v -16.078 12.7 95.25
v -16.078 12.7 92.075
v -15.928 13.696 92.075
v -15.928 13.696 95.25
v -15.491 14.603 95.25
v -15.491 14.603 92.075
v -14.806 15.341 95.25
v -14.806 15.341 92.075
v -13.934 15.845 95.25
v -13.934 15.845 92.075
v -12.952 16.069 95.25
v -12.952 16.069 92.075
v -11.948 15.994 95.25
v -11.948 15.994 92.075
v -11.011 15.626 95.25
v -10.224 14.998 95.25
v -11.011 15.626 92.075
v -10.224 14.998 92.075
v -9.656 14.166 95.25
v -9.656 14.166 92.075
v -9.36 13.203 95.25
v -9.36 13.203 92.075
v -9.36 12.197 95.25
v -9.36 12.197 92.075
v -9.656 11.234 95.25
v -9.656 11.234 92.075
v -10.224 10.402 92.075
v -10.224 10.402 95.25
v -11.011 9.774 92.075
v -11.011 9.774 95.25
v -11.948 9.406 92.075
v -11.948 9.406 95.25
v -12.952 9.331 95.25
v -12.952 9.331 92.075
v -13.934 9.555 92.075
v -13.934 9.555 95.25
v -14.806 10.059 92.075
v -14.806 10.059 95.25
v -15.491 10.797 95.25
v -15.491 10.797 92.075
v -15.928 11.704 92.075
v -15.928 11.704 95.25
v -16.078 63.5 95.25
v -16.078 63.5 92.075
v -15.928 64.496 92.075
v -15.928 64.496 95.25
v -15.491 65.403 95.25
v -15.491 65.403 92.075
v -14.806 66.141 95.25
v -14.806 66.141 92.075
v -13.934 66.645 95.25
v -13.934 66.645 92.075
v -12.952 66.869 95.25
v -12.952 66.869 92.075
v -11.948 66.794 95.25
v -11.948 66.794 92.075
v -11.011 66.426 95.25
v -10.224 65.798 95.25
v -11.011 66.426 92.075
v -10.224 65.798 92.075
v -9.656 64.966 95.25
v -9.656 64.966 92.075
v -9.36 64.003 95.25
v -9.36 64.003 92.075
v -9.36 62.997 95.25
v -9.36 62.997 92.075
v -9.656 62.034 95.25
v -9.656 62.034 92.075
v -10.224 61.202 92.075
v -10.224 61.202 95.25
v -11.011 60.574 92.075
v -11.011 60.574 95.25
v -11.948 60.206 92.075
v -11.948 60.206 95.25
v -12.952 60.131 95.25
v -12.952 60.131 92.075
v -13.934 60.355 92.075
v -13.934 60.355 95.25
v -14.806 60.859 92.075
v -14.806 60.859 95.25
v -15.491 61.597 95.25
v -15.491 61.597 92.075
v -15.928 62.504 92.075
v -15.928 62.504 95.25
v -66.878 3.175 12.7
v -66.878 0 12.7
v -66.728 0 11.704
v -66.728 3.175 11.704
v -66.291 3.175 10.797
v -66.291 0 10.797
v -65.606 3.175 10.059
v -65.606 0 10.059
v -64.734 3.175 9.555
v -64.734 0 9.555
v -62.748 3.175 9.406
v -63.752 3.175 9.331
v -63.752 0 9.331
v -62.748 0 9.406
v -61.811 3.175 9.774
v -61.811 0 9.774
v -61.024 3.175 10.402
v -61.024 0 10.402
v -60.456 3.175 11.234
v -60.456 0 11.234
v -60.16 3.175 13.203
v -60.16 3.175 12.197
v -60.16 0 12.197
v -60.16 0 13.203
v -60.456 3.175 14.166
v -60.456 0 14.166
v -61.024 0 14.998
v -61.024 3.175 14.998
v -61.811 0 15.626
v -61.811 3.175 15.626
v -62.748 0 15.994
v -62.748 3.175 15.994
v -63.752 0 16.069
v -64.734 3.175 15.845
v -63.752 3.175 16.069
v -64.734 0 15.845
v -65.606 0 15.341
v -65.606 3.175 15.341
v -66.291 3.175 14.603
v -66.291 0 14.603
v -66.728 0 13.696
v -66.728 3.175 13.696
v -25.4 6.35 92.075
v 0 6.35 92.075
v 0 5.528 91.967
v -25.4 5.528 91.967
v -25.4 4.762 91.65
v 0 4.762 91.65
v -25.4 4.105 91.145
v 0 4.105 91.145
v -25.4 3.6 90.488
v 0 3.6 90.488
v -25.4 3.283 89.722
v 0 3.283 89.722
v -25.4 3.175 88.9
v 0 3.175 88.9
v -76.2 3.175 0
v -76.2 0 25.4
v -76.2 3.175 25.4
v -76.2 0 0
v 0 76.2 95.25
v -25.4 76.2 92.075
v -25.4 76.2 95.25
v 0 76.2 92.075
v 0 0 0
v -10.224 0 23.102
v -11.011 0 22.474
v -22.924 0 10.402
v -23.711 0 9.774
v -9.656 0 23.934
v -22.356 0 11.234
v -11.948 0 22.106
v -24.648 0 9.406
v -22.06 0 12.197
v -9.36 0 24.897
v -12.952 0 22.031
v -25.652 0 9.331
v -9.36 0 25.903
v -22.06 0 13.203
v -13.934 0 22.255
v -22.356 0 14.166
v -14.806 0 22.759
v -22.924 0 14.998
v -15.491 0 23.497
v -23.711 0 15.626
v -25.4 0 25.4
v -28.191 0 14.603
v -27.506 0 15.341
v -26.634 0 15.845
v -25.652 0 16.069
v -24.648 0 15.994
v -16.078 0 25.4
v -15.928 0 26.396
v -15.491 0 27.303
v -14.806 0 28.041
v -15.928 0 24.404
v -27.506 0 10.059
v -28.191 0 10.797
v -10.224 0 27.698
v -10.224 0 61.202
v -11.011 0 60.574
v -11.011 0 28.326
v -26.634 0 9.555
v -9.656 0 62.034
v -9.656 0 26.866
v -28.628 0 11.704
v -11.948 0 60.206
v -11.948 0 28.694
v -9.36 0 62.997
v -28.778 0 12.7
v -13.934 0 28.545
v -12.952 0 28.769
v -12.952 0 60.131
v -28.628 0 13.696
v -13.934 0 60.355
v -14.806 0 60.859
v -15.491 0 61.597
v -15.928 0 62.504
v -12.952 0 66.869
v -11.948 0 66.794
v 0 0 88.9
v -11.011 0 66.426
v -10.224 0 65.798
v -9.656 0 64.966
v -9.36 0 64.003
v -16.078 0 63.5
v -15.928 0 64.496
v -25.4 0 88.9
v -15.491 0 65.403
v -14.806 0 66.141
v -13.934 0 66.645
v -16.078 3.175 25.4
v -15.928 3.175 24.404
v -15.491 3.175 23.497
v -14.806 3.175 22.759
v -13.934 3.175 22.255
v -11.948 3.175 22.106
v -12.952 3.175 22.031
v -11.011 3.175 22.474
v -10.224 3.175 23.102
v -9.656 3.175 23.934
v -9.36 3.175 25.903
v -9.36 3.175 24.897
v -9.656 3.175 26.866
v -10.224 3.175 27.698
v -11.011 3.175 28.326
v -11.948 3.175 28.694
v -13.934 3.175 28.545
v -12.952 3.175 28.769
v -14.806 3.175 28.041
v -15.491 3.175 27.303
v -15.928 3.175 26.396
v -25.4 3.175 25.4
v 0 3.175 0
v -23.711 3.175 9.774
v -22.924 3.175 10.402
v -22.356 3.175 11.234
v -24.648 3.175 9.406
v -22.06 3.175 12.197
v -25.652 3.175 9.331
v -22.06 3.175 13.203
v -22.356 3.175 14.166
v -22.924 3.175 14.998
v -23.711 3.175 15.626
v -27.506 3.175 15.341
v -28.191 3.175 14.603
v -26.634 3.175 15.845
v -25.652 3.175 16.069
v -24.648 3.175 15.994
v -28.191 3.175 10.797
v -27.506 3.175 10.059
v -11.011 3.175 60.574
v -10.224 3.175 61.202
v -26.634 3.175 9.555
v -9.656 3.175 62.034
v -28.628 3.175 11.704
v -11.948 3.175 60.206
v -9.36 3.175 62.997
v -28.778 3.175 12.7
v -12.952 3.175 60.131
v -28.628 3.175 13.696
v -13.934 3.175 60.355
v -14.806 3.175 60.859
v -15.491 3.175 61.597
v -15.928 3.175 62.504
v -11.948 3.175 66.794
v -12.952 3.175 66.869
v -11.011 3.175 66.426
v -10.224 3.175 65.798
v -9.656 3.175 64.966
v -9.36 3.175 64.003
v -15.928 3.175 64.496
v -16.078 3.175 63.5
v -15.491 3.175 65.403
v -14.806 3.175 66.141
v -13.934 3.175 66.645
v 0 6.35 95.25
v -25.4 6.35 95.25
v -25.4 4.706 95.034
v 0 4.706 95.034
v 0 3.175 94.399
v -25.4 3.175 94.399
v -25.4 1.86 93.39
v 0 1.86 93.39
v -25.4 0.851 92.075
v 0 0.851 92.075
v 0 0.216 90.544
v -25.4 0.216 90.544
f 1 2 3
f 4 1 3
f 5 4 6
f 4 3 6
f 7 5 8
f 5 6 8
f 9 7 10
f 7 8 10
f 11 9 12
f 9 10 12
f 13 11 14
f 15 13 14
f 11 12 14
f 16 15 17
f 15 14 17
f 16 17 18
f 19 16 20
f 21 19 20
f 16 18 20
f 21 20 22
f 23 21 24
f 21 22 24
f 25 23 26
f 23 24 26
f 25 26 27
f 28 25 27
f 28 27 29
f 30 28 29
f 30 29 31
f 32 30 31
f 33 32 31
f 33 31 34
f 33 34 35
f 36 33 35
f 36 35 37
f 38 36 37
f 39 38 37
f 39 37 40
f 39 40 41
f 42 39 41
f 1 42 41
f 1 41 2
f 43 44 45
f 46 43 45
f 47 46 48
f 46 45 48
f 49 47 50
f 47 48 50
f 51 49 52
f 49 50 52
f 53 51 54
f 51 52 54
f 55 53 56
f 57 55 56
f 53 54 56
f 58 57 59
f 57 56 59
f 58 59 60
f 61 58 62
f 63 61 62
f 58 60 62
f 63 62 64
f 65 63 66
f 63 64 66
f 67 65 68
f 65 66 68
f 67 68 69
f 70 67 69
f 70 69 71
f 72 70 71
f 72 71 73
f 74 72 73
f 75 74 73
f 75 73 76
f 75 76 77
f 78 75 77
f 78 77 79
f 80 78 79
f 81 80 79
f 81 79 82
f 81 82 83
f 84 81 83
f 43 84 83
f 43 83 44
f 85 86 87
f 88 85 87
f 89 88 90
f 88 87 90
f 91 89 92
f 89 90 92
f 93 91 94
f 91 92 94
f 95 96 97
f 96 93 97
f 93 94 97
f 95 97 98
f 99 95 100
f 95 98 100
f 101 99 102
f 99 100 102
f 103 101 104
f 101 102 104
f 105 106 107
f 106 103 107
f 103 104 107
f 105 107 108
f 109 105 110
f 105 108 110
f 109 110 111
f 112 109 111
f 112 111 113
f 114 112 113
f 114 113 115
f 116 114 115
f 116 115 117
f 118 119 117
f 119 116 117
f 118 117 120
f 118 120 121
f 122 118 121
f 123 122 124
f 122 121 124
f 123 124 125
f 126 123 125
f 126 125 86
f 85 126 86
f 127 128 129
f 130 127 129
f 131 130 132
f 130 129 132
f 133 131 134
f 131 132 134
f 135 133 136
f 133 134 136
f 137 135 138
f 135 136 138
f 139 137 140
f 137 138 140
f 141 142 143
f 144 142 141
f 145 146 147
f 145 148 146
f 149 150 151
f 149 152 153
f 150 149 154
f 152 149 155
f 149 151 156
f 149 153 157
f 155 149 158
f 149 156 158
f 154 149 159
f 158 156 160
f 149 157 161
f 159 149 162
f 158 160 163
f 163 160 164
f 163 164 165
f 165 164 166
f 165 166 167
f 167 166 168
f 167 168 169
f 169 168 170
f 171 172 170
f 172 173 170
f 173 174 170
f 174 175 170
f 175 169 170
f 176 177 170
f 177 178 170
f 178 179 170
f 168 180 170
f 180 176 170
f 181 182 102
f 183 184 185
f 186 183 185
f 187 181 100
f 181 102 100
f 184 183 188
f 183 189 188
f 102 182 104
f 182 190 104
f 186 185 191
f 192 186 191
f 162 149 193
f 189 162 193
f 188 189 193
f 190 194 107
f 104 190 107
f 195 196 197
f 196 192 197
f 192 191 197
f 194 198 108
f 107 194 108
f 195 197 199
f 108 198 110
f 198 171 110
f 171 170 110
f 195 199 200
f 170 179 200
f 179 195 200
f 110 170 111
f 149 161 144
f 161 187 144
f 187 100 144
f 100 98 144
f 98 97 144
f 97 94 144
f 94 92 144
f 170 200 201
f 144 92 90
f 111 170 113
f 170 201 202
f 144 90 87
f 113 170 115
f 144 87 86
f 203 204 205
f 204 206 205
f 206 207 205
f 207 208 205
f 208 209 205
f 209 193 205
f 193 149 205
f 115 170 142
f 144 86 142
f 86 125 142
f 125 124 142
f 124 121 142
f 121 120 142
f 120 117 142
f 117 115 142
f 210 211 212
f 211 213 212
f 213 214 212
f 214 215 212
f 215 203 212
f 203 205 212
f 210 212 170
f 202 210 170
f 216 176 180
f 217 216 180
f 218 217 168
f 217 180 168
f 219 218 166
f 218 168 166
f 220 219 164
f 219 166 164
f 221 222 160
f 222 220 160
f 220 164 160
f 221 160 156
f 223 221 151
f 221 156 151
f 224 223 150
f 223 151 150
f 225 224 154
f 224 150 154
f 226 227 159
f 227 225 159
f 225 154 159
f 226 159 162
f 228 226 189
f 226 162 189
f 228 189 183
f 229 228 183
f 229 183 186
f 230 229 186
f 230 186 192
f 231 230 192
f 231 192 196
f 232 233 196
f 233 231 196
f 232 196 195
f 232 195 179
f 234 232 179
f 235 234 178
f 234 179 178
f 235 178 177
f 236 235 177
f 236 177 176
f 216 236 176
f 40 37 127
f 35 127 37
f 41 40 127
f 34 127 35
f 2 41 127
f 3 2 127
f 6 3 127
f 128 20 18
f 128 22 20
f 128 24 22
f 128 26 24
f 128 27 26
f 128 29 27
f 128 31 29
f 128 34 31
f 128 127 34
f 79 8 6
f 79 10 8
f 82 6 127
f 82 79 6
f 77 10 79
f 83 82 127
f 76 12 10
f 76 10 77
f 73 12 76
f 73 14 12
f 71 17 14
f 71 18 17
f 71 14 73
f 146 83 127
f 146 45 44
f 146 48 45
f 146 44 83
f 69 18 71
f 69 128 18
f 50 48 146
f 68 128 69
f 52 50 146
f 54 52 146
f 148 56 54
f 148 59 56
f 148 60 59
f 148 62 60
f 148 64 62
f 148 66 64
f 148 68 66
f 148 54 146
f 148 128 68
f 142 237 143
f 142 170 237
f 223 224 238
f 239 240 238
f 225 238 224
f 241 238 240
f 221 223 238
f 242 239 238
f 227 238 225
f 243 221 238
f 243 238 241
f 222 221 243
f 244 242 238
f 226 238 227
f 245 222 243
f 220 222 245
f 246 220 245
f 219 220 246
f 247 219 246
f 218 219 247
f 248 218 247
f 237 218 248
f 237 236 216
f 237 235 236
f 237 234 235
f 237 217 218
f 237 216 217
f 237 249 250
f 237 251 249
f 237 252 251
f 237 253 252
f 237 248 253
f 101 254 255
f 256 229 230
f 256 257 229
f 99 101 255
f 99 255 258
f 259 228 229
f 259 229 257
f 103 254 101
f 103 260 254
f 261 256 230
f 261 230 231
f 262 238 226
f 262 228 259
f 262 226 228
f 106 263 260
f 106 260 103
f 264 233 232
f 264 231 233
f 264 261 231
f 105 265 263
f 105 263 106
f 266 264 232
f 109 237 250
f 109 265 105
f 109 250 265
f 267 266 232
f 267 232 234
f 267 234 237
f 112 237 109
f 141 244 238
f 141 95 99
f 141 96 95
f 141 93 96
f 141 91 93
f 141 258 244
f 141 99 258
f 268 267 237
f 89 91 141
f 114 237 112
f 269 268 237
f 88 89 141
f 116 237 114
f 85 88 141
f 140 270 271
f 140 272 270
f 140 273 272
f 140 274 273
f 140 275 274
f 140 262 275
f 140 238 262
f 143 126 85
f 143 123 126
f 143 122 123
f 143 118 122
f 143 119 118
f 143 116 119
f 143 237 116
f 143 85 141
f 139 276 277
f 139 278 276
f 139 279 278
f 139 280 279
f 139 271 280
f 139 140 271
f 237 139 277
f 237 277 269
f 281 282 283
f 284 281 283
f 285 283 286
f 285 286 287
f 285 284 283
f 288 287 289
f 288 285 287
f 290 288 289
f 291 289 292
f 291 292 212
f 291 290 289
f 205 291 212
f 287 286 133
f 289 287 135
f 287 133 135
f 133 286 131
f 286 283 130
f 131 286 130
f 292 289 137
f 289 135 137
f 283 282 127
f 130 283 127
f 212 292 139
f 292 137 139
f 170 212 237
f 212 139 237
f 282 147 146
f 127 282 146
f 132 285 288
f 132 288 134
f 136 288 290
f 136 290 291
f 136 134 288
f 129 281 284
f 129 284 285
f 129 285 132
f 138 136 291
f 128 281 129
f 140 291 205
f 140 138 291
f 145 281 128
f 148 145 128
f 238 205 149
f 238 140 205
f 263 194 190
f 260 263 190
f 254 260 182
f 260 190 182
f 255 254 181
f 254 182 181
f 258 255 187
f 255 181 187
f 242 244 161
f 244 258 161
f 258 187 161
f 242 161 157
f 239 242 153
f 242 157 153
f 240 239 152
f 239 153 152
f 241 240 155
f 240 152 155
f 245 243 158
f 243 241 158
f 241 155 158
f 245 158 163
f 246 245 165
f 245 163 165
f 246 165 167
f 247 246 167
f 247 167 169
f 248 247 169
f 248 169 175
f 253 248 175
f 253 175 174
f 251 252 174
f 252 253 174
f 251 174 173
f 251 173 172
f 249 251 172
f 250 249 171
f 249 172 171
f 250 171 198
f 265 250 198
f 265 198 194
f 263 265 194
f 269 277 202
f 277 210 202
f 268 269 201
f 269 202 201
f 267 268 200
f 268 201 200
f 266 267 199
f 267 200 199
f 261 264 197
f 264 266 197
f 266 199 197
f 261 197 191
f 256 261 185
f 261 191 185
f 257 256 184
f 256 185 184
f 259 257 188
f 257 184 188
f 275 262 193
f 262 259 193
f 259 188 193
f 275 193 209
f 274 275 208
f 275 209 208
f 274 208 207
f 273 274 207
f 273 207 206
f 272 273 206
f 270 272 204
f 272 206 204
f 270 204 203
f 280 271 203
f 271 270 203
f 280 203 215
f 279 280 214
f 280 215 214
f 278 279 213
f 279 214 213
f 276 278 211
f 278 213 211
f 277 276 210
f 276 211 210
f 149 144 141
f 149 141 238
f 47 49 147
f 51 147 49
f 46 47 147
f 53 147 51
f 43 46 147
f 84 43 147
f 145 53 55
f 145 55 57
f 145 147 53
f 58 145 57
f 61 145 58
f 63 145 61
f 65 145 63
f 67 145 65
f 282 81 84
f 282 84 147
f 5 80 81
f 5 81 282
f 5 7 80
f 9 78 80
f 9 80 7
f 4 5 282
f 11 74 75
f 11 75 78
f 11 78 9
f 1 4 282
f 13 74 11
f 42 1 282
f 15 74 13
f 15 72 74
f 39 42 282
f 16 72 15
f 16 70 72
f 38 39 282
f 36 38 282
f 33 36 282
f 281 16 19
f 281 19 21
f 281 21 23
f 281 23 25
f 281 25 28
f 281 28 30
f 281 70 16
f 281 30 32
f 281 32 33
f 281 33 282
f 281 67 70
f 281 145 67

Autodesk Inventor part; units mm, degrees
ref_plane "YZ Plane" through (0, 0, 0) normal (1, 0, 0) x (0, 1, 0)
ref_plane "XZ Plane" through (0, 0, 0) normal (0, 1, 0) x (-1, 0, 0)
ref_plane "XY Plane" through (0, 0, 0) normal (0, 0, 1) x (1, 0, 0)
sketch "Sketch1" plane through (0, 0, 0) normal (0, 1, 0) x (-1, 0, 0)
  line L0 (0, 0) -> (0, 76.2)
  line L1 (25.4, 76.2) -> (25.4, 25.4)
  line L2 (25.4, 25.4) -> (76.2, 25.4)
  line L3 (76.2, 25.4) -> (76.2, 0)
  line L4 (76.2, 0) -> (0, 0)
  line L5 (25.4, 25.4) -> (0, 0) construction
  circle A0 centre (12.7, 63.5) radius 3.3782
  circle A1 centre (12.7, 25.4) radius 3.3782
  circle A2 centre (25.4, 12.7) radius 3.3782
  circle A3 centre (63.5, 12.7) radius 3.3782
  line L6 (25.4, 76.2) -> (25.4, 95.25)
  line L7 (25.4, 95.25) -> (0, 95.25)
  line L8 (0, 95.25) -> (0, 76.2)
  point P0 (0, 0)
  dimension "d0" = 76.2
  dimension "d1" = 25.4
  dimension "d2" = 50.8
  dimension "d3" = 50.8
  dimension "d4" = 25.4
  dimension "d5" = 6.7564
  dimension "d6" = 6.7564
  dimension "d7" = 6.7564
  dimension "d8" = 6.7564
  dimension "d9" = 12.7
  dimension "d10" = 0
  dimension "d11" = 12.7
  dimension "d12" = 12.7
  dimension "d13" = 12.7
  dimension "d15" = 12.7
  dimension "d17" = 19.05
extrude "Plate1" add sketch "Sketch1" along normal blind 3.175
sketch "Sketch2" plane through (0, 0, 92.075) normal (0, 0, 1) x (1, 0, 0)
  line L0 (-25.4, 0) -> (0, 0)
  line L1 (0, 0) -> (0, 76.2)
  line L2 (0, 76.2) -> (-25.4, 76.2)
  line L3 (-25.4, 76.2) -> (-25.4, 0)
edge flange "Flange1" height 76.2 angle 90 thickness 3.175 bend radius 3.175 thickness toward (0, 0, 1) relief tear relief width 3.175 relief depth 1.5875 edges at (-12.7, 3.175, 95.25) wall of the first edge with corners at (-25.4, 0, 92.075) (0, 0, 92.075) (0, 76.2, 92.075) (-25.4, 76.2, 92.075)
bend "Bend1"
corner "Corner1"
sketch "Sketch3" plane through (0, 76.2, 92.075) normal (0, 0, -1) x (-1, 0, 0)
  line L0 (25.4, 0) -> (0, 0) projected
  circle A0 centre (12.7, -12.7) radius 3.3782
  circle A1 centre (12.7, -63.5) radius 3.3782
  point P0 (0, -76.2)
  dimension "d29" = 6.7564
  dimension "d30" = 6.7564
  dimension "d31" = 12.7
  dimension "d32" = 50.8
extrude "Cut1" cut sketch "Sketch3" against normal blind 3.175
equation "\"d33\" = Thickness"
equation "\"d19\" = BendReliefWidth"
equation "\"d20\" = BendReliefDepth"
equation "\"d21\" = MinimumRemnant"
equation "\"d22\" = BendRadius"
equation "\"d25\" = BendRadius"
equation "\"d26\" = CornerReliefSize"
equation "\"d27\" = GapSize"
equation "\"d28\" = JacobiRadiusSize"
equation "\"BendRadius\" = Thickness"
equation "\"BendReliefWidth\" = Thickness"
equation "\"BendReliefDepth\" = 0.5 * Thickness"
equation "\"CornerReliefSize\" = 4 * Thickness"
equation "\"MinimumRemnant\" = 2 * Thickness"
equation "\"TransitionRadius\" = BendRadius"
equation "\"JacobiRadiusSize\" = BendRadius"
equation "\"GapSize\" = Thickness"
equation "\"d18\" = BendRadius"
equation "\"Thickness\" = 3.175"
properties part number "Gusset 2"
